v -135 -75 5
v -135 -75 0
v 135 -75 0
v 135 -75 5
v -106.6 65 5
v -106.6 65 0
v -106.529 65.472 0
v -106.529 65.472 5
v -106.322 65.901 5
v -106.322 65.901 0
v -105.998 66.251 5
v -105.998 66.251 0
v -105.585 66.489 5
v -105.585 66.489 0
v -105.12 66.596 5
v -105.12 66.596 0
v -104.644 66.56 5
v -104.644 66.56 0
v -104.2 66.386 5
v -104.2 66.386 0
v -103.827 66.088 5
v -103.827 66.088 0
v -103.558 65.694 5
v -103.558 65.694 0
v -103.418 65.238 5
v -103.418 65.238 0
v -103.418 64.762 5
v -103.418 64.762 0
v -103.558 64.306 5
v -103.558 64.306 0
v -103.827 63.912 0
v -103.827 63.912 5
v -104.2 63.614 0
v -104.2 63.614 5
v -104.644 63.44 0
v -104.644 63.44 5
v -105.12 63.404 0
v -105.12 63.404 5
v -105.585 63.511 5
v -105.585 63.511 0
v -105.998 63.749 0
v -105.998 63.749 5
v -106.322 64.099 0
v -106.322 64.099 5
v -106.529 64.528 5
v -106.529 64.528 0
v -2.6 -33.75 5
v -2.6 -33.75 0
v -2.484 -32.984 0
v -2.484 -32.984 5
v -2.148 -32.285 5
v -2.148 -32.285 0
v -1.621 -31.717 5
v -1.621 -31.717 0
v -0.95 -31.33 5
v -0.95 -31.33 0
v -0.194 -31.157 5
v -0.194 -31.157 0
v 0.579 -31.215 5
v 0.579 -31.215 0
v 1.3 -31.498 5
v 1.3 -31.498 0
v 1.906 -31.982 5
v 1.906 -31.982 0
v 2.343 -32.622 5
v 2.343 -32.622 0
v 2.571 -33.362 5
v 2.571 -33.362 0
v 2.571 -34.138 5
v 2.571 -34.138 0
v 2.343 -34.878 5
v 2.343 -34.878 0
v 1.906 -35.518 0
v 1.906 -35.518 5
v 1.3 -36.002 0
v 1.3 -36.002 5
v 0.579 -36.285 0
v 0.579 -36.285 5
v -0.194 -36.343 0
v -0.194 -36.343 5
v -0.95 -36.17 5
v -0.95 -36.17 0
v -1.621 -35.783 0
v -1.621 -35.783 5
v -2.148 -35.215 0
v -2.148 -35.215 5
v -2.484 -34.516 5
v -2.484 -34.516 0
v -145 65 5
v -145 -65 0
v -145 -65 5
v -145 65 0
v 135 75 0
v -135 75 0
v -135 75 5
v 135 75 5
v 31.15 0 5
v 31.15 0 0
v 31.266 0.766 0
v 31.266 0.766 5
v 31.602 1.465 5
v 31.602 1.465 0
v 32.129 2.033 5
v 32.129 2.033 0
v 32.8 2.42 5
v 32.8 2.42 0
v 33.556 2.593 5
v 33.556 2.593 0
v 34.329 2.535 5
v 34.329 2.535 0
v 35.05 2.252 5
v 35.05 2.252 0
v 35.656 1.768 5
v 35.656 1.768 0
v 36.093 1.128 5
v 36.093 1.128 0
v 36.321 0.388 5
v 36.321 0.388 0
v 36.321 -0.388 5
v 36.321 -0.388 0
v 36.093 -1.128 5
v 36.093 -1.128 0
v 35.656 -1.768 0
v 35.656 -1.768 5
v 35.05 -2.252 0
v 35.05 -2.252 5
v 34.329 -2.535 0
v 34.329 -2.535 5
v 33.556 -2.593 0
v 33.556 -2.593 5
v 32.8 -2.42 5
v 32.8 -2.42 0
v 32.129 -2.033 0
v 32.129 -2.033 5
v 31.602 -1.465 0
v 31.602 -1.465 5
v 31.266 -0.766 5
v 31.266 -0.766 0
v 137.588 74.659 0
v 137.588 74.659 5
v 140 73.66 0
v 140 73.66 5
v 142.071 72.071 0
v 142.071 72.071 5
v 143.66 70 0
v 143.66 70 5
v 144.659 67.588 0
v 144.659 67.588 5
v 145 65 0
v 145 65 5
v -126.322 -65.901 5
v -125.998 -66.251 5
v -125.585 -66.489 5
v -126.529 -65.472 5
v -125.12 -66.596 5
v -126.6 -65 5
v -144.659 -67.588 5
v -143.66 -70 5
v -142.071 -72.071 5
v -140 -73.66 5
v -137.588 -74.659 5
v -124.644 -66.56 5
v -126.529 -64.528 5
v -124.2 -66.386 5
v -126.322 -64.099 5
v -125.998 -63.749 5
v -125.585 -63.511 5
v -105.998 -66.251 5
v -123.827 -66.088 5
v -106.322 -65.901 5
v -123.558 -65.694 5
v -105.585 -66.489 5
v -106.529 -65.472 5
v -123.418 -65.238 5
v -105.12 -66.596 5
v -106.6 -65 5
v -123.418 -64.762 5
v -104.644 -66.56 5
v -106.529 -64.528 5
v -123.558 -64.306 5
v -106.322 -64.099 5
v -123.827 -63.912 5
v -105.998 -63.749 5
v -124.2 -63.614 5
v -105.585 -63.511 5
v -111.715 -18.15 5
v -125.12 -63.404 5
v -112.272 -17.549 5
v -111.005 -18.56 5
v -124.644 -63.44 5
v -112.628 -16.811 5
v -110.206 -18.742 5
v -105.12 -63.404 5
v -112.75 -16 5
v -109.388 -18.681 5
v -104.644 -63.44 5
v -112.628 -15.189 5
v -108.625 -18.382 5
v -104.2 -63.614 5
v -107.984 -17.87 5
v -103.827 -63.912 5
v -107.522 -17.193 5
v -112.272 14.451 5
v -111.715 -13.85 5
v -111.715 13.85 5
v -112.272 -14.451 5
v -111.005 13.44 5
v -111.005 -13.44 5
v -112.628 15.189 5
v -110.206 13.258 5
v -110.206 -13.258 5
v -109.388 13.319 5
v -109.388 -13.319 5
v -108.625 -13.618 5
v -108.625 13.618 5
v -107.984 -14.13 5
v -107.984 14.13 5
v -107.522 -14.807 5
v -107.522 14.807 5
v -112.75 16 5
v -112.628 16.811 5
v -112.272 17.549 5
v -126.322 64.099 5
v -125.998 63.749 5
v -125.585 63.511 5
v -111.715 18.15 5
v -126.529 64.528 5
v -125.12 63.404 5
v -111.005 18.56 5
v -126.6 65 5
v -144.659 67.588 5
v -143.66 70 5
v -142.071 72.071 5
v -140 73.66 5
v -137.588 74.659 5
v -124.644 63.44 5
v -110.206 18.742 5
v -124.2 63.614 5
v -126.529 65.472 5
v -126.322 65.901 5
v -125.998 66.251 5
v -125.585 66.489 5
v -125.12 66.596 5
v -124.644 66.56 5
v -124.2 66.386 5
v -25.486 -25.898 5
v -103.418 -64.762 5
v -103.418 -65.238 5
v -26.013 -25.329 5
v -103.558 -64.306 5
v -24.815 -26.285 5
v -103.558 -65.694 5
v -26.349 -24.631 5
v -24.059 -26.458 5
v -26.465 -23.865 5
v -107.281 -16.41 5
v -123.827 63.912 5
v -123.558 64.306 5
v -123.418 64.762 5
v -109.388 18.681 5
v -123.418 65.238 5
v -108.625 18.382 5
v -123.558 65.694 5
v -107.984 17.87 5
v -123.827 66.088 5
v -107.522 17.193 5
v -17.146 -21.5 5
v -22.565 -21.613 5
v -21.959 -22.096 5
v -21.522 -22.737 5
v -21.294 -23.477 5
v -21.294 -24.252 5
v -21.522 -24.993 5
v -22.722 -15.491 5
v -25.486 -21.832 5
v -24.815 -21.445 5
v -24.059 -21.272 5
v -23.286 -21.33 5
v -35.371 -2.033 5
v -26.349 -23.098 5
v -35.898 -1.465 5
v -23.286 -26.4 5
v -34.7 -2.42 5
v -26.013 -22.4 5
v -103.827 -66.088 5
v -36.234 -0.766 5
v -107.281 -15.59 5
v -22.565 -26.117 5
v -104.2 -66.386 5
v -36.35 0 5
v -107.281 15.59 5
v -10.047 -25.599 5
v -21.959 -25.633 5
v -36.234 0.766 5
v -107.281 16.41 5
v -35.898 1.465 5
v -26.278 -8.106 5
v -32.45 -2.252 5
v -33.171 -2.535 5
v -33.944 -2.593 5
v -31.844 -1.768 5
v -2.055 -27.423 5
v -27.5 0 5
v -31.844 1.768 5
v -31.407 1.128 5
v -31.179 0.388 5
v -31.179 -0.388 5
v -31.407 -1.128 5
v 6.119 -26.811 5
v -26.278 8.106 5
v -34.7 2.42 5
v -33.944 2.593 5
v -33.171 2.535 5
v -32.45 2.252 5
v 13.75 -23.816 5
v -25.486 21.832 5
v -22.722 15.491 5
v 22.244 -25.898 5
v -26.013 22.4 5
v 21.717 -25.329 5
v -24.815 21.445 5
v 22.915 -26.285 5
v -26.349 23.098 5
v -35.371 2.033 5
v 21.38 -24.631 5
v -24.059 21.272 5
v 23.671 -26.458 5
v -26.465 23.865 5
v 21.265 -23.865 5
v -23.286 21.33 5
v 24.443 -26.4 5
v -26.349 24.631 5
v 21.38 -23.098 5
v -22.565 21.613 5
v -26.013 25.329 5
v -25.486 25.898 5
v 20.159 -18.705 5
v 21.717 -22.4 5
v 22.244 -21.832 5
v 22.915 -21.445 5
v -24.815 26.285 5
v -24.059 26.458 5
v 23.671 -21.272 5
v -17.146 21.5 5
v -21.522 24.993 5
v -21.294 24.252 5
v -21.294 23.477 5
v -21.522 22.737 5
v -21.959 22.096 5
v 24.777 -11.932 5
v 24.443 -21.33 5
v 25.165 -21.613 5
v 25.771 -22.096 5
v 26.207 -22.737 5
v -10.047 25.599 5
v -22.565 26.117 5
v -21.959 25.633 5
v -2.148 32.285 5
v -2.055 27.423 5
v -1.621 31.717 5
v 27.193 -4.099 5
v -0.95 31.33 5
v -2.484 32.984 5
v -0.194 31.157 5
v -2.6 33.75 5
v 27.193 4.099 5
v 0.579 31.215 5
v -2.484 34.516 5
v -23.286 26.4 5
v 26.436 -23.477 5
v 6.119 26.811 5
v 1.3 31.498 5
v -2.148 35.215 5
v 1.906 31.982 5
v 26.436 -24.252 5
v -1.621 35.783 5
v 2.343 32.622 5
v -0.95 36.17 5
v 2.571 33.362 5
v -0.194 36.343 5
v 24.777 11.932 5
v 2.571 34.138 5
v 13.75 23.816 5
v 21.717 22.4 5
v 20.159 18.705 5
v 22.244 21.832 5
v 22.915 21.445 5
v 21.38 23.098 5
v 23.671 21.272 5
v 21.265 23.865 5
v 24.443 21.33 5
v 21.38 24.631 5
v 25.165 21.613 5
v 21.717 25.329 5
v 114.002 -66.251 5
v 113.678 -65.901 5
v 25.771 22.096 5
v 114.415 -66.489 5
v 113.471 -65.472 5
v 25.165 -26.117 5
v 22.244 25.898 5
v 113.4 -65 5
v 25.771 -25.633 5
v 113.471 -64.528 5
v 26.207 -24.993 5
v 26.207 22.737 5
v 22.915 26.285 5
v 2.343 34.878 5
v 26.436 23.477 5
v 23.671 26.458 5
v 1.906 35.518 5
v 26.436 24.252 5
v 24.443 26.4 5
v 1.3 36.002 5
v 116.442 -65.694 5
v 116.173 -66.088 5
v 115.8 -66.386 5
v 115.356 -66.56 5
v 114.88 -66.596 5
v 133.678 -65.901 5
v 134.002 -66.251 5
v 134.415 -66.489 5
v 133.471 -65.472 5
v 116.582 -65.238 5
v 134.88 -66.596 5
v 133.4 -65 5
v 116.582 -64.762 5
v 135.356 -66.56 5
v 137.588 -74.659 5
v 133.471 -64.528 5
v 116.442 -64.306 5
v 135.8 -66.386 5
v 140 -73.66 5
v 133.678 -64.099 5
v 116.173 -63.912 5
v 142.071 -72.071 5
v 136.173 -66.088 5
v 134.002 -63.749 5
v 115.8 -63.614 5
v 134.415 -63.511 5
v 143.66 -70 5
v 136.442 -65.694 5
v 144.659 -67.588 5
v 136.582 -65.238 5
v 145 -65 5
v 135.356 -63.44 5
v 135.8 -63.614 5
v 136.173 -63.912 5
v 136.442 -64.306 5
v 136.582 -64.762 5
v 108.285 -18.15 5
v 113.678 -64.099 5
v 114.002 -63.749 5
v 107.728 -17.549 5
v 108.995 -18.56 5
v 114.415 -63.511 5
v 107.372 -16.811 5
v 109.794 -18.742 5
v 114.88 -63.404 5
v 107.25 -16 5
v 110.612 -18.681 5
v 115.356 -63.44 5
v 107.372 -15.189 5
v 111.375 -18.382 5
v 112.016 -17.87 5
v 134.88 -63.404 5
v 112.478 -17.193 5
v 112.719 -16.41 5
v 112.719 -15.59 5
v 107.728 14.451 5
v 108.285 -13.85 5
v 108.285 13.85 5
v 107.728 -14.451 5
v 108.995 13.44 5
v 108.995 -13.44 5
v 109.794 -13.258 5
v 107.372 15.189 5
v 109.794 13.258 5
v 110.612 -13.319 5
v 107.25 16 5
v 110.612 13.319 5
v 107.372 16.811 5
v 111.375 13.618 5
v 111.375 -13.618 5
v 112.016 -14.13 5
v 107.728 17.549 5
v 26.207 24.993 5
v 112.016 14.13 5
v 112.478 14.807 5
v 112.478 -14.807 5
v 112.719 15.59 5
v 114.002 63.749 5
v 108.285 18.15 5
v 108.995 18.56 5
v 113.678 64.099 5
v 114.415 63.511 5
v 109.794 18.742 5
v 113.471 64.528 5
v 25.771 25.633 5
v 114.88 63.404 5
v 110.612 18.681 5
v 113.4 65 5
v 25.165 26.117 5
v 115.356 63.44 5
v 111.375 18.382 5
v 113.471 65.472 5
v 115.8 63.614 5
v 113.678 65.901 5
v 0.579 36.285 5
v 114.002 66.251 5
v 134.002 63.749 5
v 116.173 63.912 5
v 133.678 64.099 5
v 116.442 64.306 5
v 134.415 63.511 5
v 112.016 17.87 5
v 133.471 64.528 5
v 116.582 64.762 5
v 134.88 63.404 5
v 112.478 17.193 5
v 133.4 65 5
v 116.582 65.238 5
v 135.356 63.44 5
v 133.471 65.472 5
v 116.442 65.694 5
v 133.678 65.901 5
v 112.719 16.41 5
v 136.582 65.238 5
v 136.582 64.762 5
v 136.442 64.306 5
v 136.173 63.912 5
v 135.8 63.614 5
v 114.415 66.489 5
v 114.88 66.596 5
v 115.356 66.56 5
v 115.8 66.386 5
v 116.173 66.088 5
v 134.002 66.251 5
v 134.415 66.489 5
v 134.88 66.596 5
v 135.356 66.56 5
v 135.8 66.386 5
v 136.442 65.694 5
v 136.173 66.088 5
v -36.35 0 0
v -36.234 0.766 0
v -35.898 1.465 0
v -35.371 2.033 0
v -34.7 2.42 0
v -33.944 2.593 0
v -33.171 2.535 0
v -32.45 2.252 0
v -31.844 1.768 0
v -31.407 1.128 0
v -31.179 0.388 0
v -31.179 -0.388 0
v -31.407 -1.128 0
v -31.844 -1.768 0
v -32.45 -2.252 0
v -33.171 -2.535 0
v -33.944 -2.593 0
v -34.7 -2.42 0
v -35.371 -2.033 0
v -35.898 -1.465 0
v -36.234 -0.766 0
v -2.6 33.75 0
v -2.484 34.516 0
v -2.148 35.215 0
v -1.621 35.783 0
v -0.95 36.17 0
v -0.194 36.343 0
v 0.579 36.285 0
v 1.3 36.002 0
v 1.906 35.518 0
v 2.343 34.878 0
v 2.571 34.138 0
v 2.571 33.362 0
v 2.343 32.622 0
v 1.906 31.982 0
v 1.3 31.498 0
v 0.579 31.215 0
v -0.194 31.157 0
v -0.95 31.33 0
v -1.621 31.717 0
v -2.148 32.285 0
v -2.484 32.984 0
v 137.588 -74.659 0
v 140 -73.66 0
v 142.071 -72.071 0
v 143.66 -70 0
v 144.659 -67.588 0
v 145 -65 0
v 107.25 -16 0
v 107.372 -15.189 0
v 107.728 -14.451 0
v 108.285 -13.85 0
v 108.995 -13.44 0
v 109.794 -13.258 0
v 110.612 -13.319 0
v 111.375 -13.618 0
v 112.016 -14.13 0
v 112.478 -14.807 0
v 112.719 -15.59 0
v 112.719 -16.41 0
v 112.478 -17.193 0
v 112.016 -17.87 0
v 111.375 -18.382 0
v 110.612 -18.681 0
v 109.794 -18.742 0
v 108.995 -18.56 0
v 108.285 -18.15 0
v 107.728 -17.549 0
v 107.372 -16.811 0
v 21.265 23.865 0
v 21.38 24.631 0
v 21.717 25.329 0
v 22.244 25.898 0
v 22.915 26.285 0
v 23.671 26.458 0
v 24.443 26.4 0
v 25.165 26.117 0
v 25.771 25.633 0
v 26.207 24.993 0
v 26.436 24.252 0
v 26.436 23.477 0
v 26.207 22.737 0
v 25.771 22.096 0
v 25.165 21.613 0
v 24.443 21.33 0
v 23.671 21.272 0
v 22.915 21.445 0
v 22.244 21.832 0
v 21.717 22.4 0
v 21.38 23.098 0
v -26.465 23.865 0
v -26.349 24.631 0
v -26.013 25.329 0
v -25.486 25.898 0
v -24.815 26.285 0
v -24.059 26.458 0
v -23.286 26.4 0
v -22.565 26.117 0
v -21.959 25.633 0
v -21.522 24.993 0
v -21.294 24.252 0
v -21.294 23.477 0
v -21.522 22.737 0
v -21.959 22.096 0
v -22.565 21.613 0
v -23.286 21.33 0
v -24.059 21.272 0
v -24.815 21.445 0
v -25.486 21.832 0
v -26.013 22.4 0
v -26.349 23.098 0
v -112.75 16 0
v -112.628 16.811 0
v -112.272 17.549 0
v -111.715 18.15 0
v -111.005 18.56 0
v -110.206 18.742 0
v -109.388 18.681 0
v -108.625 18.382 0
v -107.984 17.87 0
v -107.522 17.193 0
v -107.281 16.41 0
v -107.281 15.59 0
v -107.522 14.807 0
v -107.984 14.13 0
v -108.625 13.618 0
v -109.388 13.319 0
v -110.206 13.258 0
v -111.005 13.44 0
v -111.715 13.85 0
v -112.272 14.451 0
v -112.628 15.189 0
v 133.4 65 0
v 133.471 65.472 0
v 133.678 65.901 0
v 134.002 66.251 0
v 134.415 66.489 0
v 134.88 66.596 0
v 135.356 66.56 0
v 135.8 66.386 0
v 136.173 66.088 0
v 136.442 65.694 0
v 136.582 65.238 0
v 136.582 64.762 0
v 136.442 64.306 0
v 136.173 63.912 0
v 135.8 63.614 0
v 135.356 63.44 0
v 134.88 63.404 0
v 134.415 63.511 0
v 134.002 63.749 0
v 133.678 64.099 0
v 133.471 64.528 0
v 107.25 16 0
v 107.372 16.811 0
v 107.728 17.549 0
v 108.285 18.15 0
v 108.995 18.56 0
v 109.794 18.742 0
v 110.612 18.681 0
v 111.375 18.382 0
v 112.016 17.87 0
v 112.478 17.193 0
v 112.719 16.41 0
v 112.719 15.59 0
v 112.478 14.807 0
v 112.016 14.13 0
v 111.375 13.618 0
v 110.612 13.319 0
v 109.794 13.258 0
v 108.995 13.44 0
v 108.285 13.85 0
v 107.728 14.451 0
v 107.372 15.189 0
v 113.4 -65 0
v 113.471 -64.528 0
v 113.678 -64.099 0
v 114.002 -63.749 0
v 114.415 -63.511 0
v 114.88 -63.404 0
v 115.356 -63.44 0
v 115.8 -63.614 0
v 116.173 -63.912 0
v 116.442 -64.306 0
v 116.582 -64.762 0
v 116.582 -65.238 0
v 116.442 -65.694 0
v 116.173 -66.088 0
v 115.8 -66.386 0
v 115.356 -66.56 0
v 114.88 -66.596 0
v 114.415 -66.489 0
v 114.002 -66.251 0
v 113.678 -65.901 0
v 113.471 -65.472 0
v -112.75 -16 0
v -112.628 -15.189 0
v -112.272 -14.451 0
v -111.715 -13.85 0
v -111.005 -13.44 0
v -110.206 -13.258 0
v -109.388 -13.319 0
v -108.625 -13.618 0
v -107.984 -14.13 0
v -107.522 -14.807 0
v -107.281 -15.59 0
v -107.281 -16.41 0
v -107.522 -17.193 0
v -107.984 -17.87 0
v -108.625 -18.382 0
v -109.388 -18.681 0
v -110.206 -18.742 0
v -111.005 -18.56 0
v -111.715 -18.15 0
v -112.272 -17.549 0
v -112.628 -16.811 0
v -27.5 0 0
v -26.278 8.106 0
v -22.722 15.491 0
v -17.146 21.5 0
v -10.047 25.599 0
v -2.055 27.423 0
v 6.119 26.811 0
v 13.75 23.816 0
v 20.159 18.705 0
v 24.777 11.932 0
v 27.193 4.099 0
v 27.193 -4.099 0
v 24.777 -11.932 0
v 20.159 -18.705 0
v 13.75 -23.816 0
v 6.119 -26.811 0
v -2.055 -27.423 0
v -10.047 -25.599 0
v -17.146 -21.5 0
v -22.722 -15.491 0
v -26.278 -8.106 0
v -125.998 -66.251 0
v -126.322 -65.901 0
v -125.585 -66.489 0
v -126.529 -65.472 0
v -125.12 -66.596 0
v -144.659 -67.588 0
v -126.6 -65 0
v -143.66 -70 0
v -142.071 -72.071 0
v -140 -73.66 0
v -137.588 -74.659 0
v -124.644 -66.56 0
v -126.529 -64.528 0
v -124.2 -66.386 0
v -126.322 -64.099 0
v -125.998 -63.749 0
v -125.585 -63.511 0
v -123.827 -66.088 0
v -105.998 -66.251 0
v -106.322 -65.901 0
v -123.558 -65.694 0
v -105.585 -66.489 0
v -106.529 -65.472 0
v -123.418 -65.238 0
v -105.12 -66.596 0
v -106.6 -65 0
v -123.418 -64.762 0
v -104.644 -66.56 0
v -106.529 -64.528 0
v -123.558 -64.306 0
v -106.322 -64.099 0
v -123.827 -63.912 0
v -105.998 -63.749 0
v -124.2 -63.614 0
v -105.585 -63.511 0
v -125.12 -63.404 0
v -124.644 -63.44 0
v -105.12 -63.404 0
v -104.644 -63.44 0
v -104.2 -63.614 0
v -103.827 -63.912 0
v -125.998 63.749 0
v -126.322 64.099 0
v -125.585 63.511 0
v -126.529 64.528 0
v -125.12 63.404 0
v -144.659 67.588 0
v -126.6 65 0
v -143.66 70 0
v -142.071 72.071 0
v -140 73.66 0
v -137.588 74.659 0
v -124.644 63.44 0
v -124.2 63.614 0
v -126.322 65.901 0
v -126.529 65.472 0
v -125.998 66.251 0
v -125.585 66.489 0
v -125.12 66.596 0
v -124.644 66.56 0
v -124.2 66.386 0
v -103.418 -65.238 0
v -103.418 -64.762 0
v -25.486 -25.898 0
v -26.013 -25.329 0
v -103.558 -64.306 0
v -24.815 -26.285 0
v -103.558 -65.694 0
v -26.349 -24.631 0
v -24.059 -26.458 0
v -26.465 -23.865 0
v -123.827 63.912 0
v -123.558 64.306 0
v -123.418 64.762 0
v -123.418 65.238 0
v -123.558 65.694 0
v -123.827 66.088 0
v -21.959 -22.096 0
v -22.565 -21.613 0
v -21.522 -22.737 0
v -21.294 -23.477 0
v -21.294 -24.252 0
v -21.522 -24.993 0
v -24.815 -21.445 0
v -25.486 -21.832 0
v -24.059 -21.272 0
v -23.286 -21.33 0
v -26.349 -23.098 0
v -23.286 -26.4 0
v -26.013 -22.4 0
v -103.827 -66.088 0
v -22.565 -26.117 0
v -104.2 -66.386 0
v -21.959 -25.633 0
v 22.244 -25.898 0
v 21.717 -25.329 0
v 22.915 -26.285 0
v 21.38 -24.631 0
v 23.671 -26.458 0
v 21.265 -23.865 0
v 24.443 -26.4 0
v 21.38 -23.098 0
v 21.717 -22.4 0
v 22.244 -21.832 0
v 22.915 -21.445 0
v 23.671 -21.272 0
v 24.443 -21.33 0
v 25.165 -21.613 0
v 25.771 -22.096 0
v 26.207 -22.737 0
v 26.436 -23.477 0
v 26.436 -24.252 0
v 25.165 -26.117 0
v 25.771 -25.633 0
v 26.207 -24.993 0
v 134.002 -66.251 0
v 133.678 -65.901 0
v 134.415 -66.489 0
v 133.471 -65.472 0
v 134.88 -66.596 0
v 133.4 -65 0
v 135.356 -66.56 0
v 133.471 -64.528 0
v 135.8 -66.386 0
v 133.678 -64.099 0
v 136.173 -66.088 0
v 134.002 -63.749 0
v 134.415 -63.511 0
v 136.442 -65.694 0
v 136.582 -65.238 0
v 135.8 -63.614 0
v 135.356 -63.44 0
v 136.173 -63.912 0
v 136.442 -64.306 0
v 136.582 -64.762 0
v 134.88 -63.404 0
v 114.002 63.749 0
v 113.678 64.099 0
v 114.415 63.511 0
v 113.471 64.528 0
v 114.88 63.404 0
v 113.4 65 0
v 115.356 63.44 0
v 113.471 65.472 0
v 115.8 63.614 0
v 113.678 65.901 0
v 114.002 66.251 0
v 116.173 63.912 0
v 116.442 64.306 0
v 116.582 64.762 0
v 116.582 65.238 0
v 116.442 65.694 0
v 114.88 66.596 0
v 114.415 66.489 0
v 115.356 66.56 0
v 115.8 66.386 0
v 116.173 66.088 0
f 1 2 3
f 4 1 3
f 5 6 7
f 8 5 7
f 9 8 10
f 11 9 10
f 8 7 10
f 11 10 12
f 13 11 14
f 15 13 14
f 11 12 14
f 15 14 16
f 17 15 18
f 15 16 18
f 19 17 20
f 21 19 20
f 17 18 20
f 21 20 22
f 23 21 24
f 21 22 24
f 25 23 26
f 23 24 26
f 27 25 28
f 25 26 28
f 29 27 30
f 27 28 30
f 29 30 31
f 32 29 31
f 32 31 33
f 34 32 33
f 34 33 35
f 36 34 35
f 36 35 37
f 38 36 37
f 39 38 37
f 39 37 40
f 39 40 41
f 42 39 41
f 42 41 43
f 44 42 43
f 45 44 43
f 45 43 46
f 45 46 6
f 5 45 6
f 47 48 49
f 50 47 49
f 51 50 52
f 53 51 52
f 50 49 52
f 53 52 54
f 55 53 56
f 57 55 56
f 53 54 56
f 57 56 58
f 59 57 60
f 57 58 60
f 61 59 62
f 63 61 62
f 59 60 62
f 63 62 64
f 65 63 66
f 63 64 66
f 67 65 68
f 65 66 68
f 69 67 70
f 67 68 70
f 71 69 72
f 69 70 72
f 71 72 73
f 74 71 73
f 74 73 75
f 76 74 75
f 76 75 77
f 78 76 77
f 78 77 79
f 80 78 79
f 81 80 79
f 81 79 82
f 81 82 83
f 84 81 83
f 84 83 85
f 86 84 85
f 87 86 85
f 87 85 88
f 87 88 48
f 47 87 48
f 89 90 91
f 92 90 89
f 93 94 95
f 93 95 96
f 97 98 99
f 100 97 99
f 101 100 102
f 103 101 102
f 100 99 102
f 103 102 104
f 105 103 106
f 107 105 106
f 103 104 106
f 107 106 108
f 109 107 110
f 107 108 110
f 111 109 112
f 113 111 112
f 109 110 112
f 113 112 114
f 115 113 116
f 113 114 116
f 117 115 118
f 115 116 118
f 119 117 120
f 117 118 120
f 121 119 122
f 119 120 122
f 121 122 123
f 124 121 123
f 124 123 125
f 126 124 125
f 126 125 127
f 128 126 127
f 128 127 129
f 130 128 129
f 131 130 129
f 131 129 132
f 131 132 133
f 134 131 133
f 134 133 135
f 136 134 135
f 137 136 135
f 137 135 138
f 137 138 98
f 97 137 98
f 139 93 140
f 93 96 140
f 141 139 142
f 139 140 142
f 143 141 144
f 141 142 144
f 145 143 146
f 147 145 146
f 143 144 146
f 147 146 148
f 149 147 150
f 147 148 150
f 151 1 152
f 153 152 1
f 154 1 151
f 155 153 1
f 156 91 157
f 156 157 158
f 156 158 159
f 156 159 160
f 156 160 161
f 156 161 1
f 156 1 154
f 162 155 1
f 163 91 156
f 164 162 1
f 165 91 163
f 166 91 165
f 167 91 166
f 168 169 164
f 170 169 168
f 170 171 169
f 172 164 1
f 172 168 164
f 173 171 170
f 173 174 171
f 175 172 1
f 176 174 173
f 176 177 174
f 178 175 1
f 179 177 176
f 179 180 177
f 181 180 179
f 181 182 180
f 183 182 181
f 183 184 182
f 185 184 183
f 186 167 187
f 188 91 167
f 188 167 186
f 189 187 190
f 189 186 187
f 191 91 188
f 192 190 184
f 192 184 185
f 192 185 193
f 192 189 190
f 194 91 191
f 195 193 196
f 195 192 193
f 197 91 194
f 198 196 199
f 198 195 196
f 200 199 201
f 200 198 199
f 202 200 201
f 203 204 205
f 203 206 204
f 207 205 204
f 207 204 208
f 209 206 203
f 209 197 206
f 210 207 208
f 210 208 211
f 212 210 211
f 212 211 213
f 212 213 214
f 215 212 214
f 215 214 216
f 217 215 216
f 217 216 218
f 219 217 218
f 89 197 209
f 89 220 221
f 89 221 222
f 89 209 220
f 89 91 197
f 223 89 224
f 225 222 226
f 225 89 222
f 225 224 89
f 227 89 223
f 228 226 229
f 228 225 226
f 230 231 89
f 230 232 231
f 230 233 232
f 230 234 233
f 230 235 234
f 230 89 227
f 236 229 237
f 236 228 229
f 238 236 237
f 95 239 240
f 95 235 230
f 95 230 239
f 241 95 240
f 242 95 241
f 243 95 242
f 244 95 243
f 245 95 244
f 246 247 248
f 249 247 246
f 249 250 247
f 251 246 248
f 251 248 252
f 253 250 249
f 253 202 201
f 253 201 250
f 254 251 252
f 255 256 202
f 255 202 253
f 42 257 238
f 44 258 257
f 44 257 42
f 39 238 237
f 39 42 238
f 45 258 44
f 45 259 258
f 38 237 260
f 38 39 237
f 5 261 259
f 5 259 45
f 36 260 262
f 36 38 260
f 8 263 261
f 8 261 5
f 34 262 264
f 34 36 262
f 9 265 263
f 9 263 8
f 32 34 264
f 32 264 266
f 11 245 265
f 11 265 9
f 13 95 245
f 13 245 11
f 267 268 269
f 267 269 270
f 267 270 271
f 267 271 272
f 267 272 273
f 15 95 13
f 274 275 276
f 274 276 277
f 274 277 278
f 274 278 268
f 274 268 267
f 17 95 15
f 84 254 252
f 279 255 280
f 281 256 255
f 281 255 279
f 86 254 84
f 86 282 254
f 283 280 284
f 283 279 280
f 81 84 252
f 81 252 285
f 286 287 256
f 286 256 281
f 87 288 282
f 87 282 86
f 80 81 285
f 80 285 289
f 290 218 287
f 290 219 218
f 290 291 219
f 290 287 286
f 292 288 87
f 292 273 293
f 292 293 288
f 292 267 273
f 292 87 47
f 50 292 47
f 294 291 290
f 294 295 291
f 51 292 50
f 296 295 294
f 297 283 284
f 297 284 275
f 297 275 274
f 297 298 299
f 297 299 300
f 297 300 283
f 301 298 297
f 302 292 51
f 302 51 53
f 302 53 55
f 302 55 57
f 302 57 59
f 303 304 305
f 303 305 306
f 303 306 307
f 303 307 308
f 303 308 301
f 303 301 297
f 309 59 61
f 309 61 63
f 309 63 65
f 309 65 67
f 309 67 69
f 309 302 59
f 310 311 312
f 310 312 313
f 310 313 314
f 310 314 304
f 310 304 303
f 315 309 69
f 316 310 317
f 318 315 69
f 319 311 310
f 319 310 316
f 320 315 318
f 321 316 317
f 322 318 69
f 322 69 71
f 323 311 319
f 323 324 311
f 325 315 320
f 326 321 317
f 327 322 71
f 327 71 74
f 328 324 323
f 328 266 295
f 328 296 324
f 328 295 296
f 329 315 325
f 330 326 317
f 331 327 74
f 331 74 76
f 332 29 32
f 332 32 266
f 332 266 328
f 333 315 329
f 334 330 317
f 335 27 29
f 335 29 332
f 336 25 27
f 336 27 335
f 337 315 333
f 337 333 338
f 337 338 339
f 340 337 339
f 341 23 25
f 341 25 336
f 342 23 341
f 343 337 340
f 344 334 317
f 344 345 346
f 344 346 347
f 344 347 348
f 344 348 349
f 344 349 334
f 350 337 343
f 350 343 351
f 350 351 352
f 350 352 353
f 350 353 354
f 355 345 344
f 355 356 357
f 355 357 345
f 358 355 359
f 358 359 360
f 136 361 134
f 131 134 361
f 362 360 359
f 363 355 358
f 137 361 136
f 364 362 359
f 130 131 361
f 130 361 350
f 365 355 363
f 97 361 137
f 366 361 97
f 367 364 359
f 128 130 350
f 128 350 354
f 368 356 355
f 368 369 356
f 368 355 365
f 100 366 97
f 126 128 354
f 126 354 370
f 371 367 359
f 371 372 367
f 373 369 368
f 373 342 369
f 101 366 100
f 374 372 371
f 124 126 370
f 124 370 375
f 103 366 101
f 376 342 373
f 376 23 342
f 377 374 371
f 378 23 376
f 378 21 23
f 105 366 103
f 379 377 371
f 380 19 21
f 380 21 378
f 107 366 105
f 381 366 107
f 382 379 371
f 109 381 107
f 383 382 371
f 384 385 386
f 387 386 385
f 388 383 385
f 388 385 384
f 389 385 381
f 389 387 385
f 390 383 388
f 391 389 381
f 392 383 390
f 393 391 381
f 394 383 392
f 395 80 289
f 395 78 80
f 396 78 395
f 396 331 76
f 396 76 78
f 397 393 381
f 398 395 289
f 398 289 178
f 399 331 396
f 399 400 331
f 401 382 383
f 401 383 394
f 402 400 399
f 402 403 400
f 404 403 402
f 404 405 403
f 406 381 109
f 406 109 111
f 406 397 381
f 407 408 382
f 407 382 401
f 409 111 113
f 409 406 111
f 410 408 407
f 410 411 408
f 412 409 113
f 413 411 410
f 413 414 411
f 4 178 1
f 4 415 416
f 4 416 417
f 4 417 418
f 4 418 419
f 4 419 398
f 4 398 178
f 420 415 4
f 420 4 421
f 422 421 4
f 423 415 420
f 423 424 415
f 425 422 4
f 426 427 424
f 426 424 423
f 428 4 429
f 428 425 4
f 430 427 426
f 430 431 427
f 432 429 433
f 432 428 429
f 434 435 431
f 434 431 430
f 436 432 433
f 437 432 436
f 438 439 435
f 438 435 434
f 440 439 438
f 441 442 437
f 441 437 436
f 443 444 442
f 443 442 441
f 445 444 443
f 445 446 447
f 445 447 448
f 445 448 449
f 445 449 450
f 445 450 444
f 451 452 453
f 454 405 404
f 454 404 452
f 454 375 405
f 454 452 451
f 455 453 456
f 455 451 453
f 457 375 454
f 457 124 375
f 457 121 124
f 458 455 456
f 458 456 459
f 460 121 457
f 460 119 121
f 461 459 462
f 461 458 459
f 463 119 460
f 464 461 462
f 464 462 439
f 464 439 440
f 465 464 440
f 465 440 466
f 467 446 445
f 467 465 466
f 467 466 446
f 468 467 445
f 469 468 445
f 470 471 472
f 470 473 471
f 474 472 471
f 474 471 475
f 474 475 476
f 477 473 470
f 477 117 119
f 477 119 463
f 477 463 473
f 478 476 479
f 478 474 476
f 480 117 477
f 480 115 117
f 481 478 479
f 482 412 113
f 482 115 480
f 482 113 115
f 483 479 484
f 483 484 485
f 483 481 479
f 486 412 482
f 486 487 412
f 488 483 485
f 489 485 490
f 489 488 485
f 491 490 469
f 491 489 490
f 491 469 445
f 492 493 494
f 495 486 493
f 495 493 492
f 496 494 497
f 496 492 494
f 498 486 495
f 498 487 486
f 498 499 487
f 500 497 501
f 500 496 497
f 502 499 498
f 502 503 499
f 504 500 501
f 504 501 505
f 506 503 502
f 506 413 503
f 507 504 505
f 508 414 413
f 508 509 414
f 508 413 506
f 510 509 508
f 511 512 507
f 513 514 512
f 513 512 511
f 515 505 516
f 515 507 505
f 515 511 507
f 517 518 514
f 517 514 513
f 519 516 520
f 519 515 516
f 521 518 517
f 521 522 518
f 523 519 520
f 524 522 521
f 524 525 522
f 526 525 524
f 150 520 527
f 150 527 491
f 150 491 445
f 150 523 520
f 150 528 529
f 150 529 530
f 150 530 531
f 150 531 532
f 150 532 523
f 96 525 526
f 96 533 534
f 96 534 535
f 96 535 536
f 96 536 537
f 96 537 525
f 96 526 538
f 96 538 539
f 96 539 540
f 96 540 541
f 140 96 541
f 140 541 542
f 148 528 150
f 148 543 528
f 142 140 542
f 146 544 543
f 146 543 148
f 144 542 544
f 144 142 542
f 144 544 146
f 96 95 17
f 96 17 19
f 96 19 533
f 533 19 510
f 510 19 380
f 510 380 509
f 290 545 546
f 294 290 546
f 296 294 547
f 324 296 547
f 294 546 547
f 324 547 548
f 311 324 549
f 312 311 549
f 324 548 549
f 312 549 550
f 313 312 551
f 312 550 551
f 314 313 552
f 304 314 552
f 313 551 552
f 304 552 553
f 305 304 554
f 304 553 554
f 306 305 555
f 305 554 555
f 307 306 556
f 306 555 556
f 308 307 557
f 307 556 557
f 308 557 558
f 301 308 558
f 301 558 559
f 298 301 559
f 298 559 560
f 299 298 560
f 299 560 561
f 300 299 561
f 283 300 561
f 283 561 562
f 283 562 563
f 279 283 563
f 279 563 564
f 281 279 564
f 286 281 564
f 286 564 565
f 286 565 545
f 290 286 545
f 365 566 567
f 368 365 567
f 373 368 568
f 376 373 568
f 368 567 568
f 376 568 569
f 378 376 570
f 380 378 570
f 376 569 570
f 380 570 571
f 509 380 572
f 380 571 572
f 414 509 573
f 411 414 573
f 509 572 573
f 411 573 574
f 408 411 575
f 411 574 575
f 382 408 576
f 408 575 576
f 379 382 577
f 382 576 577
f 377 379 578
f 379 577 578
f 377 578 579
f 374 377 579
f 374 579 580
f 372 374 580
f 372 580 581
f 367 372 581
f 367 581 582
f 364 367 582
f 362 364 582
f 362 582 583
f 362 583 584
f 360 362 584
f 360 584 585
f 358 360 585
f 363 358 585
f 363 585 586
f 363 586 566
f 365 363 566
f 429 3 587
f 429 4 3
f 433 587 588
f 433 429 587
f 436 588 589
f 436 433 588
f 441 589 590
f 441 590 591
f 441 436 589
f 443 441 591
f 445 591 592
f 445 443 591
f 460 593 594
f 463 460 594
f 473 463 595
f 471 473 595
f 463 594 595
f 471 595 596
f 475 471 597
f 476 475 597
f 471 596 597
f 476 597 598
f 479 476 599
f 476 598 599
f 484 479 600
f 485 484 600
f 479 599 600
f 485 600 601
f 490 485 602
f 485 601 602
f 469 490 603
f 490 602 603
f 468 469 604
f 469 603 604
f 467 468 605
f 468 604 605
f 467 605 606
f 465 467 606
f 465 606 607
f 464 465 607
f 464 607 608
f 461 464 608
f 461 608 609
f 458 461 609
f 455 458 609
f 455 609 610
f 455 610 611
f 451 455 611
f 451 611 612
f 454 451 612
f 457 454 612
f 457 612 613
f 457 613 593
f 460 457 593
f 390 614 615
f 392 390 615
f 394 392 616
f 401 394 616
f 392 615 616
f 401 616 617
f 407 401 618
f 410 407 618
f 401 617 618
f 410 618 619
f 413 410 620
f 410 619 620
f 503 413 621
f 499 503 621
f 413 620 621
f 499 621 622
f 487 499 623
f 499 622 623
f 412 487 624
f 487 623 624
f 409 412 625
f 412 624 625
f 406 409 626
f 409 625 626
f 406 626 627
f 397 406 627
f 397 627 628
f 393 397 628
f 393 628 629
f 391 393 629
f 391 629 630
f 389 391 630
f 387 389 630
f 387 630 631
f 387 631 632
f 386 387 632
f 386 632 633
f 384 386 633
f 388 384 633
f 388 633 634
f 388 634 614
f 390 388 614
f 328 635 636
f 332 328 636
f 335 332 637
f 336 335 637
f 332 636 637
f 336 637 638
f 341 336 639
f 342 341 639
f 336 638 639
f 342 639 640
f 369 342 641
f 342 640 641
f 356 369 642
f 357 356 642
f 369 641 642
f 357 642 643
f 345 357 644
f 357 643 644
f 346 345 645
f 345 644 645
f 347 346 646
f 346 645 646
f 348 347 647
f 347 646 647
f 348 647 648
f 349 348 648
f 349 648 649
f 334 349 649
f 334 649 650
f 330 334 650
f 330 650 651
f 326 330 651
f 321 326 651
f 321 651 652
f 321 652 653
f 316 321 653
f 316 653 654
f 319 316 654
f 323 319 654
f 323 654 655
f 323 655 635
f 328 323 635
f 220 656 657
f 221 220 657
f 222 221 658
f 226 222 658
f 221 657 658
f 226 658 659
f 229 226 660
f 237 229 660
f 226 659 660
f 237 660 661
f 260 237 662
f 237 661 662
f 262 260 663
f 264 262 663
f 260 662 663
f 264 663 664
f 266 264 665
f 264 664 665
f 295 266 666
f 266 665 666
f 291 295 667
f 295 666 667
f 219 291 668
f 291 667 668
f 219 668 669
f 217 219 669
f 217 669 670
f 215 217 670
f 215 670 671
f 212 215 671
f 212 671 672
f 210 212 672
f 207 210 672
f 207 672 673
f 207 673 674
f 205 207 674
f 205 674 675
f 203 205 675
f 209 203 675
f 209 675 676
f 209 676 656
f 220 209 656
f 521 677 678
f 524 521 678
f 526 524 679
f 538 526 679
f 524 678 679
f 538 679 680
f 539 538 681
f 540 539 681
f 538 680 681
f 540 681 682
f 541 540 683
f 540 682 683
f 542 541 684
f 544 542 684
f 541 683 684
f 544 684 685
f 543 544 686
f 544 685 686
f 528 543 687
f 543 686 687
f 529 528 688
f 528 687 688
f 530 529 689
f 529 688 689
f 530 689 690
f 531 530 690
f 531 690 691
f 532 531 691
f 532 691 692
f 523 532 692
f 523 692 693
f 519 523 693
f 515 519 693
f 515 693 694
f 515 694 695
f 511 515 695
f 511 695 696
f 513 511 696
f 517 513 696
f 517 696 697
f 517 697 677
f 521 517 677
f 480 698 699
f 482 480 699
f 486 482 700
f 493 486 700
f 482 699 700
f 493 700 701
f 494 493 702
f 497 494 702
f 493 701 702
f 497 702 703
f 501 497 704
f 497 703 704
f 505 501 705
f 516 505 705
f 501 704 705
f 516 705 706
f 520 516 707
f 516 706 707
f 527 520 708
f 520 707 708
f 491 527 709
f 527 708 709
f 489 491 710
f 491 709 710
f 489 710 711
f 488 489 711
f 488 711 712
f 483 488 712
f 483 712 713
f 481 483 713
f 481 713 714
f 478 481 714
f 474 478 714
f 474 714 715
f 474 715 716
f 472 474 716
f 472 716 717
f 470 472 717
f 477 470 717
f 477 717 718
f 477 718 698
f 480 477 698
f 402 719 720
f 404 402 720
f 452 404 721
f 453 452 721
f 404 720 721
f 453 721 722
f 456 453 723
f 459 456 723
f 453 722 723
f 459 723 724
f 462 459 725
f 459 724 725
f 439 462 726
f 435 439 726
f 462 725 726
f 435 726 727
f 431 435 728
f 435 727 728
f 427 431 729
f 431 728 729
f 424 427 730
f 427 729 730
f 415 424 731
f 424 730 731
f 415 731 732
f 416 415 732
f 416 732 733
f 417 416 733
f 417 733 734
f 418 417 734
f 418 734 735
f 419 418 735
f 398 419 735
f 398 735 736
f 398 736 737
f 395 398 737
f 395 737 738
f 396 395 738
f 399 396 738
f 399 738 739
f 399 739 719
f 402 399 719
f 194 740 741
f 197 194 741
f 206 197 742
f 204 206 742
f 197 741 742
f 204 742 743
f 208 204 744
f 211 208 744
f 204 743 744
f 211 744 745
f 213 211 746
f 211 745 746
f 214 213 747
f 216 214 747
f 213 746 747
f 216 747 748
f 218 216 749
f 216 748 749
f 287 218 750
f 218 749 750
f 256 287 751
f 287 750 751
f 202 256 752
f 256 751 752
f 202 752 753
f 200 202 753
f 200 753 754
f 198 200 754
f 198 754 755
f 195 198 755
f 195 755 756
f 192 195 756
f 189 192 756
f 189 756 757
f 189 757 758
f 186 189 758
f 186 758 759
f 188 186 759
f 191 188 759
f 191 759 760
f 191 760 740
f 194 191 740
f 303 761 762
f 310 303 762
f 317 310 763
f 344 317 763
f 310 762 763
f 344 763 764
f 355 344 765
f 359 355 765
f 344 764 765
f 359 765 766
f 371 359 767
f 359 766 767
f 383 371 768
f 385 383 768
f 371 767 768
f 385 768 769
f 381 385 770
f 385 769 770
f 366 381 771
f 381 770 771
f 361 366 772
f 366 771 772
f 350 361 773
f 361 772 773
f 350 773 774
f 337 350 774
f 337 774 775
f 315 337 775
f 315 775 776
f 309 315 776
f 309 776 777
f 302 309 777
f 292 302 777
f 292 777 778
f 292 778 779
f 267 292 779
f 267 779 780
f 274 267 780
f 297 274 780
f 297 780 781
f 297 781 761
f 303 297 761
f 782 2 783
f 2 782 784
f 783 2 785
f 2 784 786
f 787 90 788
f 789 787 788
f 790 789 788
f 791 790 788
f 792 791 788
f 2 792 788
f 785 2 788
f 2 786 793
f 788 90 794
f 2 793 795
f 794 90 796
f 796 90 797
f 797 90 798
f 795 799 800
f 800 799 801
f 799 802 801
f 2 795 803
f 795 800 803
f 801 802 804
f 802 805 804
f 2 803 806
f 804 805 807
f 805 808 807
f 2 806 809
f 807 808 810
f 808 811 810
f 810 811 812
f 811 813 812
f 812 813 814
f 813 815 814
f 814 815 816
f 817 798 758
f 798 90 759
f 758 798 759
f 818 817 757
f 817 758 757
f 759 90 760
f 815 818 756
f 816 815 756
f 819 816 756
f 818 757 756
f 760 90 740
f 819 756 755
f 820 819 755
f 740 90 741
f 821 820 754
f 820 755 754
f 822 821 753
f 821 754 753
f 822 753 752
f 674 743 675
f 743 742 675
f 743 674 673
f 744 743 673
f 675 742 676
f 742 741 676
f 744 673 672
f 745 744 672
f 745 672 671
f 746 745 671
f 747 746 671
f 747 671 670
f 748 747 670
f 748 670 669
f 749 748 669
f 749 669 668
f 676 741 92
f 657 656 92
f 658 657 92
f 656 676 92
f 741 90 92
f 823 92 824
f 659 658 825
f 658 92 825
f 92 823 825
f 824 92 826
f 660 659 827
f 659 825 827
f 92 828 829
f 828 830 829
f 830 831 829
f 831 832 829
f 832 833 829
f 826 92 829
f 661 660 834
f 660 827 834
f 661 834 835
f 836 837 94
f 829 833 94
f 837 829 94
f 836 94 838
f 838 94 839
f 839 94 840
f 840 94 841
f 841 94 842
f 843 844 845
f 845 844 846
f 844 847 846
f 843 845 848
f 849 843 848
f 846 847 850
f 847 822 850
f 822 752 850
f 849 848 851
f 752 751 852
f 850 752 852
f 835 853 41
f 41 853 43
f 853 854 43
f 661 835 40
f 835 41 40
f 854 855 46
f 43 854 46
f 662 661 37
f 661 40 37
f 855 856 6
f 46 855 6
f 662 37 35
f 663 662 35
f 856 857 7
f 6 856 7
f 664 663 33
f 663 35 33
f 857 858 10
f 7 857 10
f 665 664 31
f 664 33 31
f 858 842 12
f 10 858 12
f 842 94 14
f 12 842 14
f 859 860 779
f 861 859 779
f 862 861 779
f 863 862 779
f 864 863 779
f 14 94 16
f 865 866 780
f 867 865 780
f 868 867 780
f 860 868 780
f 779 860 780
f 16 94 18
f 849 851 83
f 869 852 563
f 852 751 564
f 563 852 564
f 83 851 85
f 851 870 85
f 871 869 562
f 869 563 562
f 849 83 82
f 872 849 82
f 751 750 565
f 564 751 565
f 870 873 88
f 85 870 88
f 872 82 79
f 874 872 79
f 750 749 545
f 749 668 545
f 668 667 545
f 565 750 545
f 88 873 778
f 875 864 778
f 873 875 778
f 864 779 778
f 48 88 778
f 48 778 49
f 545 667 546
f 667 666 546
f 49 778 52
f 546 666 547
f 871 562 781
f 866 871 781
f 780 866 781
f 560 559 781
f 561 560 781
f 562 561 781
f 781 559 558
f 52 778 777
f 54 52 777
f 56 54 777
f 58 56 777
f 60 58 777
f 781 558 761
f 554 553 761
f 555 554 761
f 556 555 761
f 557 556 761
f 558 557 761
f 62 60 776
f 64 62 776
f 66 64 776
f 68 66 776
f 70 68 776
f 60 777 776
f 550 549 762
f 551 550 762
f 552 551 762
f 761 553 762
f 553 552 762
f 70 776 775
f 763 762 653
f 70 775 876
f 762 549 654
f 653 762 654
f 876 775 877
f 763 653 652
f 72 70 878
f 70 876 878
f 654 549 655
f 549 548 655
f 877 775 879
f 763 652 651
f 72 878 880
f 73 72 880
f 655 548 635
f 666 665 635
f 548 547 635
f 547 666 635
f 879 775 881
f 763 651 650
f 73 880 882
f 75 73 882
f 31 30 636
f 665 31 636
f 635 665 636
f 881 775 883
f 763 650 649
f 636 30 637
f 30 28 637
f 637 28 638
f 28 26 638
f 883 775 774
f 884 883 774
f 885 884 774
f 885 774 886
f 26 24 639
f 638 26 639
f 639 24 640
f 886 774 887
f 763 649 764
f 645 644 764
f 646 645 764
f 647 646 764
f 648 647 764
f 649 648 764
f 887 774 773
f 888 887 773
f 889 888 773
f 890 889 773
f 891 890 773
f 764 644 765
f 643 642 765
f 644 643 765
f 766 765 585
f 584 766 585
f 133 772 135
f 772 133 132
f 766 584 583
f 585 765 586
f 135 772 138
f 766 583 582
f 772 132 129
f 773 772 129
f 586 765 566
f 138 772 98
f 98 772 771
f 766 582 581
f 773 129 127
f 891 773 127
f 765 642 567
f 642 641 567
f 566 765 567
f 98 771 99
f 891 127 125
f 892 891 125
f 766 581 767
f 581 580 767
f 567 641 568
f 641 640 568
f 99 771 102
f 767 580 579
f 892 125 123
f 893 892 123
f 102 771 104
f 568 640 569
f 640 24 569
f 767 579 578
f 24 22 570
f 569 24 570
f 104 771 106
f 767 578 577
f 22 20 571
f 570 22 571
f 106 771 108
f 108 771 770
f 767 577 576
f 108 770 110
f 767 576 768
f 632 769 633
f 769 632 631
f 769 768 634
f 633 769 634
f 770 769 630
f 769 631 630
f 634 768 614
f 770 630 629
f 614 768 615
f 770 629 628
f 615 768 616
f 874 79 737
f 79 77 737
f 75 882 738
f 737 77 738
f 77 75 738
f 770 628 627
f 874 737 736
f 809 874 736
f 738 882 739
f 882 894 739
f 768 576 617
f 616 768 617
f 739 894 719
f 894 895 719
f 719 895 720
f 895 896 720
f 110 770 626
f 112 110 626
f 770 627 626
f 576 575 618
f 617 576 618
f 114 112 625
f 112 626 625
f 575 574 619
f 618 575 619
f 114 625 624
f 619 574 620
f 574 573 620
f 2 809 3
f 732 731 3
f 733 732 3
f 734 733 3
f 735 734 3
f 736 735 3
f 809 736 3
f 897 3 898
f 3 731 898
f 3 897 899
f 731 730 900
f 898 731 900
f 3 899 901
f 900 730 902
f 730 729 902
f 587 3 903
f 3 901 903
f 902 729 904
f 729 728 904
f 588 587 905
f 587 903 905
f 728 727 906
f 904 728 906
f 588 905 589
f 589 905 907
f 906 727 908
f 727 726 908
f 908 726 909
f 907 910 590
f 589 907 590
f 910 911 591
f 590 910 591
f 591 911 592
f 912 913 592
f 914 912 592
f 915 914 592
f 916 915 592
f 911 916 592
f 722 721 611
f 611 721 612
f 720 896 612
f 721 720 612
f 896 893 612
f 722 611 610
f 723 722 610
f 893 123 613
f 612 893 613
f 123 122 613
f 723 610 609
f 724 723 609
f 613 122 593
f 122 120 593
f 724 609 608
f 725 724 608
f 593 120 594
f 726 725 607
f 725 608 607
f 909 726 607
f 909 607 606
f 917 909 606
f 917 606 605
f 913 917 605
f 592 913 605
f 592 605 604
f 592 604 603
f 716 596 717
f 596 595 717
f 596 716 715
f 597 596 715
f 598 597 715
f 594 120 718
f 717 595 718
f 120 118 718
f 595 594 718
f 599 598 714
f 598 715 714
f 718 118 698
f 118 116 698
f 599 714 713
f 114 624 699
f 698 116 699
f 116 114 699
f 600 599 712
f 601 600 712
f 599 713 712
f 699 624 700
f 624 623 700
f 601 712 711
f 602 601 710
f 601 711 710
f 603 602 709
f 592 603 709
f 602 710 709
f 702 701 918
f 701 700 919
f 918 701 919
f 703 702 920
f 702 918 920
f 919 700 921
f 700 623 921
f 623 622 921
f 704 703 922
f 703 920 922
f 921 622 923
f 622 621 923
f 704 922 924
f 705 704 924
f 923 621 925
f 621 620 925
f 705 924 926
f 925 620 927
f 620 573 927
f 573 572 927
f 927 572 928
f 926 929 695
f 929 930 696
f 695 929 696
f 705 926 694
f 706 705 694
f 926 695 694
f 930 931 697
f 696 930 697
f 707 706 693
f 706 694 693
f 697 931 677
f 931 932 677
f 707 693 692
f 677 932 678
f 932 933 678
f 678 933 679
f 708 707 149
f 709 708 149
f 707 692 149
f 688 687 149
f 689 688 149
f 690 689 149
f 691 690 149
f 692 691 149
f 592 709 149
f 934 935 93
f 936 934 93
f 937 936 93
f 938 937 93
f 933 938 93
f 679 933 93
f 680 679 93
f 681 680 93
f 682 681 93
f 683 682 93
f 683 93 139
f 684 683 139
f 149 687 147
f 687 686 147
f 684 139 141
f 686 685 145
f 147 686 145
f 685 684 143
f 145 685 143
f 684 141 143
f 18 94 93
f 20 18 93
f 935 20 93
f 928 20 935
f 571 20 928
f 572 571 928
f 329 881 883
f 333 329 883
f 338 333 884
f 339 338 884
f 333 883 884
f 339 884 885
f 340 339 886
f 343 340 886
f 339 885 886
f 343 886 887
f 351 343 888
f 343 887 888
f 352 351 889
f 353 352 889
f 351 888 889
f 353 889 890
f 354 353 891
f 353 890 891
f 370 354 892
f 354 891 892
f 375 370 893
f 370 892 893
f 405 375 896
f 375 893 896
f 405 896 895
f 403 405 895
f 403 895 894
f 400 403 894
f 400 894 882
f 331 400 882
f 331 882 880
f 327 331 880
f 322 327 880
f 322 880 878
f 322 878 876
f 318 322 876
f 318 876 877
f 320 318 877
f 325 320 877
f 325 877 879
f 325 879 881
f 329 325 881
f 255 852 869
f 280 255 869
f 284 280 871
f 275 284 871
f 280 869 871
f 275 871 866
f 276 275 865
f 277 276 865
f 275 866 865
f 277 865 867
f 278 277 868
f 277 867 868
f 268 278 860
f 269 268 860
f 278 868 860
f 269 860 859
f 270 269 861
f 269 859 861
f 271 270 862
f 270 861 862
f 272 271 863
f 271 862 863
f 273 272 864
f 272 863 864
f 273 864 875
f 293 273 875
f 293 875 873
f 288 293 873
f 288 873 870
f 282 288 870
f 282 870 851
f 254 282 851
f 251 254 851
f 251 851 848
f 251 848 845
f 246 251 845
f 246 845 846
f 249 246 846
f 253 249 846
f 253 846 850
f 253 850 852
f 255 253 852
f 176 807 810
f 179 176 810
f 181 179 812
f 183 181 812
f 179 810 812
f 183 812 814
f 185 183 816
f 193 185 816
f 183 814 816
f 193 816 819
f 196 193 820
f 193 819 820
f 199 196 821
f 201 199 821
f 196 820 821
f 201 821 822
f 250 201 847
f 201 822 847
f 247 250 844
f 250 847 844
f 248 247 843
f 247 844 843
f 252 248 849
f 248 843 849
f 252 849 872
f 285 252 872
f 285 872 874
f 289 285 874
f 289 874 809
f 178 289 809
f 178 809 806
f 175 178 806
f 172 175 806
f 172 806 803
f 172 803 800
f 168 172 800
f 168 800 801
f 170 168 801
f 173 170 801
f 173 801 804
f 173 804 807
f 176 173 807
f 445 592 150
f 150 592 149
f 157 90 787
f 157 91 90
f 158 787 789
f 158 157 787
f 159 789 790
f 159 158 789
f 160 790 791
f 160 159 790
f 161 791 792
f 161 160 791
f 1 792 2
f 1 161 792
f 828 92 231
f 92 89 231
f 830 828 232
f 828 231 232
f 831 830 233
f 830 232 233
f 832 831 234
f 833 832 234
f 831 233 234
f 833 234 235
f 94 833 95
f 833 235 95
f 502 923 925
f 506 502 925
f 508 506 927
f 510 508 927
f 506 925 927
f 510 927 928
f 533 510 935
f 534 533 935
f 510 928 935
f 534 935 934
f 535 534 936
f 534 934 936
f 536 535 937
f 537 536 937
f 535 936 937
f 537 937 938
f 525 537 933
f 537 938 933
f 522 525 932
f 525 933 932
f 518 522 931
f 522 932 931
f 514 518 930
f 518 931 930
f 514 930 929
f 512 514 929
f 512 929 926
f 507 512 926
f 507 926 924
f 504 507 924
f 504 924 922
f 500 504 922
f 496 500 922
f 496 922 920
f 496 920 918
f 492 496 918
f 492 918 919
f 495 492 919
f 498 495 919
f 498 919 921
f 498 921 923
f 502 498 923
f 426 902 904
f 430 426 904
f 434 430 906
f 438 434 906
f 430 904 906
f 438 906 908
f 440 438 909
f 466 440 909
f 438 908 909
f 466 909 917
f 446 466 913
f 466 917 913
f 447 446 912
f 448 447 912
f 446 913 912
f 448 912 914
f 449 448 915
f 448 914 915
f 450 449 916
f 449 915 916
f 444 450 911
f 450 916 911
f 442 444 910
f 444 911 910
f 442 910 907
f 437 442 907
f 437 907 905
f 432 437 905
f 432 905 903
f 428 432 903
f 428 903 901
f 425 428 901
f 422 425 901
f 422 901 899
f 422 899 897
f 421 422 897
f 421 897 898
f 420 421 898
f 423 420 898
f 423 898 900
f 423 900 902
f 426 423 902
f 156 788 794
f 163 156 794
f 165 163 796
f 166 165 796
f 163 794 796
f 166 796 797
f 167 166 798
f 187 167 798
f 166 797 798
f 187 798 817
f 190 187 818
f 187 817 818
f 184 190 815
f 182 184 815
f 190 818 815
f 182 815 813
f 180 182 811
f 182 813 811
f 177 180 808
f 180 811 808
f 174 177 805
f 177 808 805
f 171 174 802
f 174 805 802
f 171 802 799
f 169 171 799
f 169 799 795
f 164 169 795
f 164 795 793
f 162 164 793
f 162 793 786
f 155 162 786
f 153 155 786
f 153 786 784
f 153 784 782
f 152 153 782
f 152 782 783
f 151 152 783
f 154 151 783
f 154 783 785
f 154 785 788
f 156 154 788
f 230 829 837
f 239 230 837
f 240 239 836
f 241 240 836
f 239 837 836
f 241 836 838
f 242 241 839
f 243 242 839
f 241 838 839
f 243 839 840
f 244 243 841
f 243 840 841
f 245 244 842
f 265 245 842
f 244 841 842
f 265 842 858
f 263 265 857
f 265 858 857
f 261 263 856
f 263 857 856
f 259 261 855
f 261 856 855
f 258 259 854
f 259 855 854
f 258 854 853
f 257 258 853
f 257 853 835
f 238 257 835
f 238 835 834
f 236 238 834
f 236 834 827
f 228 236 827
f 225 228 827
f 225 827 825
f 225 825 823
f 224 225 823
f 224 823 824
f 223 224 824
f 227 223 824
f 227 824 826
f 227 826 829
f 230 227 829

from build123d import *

# Parameters (mm, degrees)
SKETCH_1_W          = 290
SKETCH_1_H          = 150
EXTRUDE_1_DEPTH     = 5
CUT_EXTRUDE_2_REACH = 165.325
SKETCH_5_R          = 27.5
SKETCH_5_R_2        = 2.6
FILLET_1_R          = 10
SKETCH_6_R          = 2.75
CUT_EXTRUDE_3_DEPTH = 10
SKETCH_7_R          = 1.6
CUT_EXTRUDE_4_DEPTH = 10


with BuildPart() as part:
    # 草图1 → 凸台-拉伸1 (new body)
    with BuildSketch(Plane.XY):
        Rectangle(SKETCH_1_W, SKETCH_1_H)
    extrude(amount=EXTRUDE_1_DEPTH)

    # 草图5 → 切除-拉伸2 (cut, up to next)
    with BuildSketch(Plane(origin=(0, 0, 0), x_dir=(-1, 0, 0), z_dir=(0, 0, -1)), mode=Mode.PRIVATE) as cut_extrude_2_sk1:
        Circle(SKETCH_5_R)
    cut_extrude_2_tool1 = extrude(cut_extrude_2_sk1.sketch, amount=-CUT_EXTRUDE_2_REACH, mode=Mode.PRIVATE) & part.part
    # 草图5 → 切除-拉伸2 (cut, up to next)
    with BuildSketch(Plane(origin=(0, 0, 0), x_dir=(-1, 0, 0), z_dir=(0, 0, -1)), mode=Mode.PRIVATE) as cut_extrude_2_sk2:
        with Locations((23.864853865, 23.864853865)):
            Circle(SKETCH_5_R_2)
    cut_extrude_2_tool2 = extrude(cut_extrude_2_sk2.sketch, amount=-CUT_EXTRUDE_2_REACH, mode=Mode.PRIVATE) & part.part
    # 草图5 → 切除-拉伸2 (cut, up to next)
    with BuildSketch(Plane(origin=(0, 0, 0), x_dir=(-1, 0, 0), z_dir=(0, 0, -1)), mode=Mode.PRIVATE) as cut_extrude_2_sk3:
        with Locations((0, 33.75)):
            Circle(SKETCH_5_R_2)
    cut_extrude_2_tool3 = extrude(cut_extrude_2_sk3.sketch, amount=-CUT_EXTRUDE_2_REACH, mode=Mode.PRIVATE) & part.part
    # 草图5 → 切除-拉伸2 (cut, up to next)
    with BuildSketch(Plane(origin=(0, 0, 0), x_dir=(-1, 0, 0), z_dir=(0, 0, -1)), mode=Mode.PRIVATE) as cut_extrude_2_sk4:
        with Locations((-23.864853865, 23.864853865)):
            Circle(SKETCH_5_R_2)
    cut_extrude_2_tool4 = extrude(cut_extrude_2_sk4.sketch, amount=-CUT_EXTRUDE_2_REACH, mode=Mode.PRIVATE) & part.part
    # 草图5 → 切除-拉伸2 (cut, up to next)
    with BuildSketch(Plane(origin=(0, 0, 0), x_dir=(-1, 0, 0), z_dir=(0, 0, -1)), mode=Mode.PRIVATE) as cut_extrude_2_sk5:
        with Locations((-33.75, 0)):
            Circle(SKETCH_5_R_2)
    cut_extrude_2_tool5 = extrude(cut_extrude_2_sk5.sketch, amount=-CUT_EXTRUDE_2_REACH, mode=Mode.PRIVATE) & part.part
    # 草图5 → 切除-拉伸2 (cut, up to next)
    with BuildSketch(Plane(origin=(0, 0, 0), x_dir=(-1, 0, 0), z_dir=(0, 0, -1)), mode=Mode.PRIVATE) as cut_extrude_2_sk6:
        with Locations((-23.864853865, -23.864853865)):
            Circle(SKETCH_5_R_2)
    cut_extrude_2_tool6 = extrude(cut_extrude_2_sk6.sketch, amount=-CUT_EXTRUDE_2_REACH, mode=Mode.PRIVATE) & part.part
    # 草图5 → 切除-拉伸2 (cut, up to next)
    with BuildSketch(Plane(origin=(0, 0, 0), x_dir=(-1, 0, 0), z_dir=(0, 0, -1)), mode=Mode.PRIVATE) as cut_extrude_2_sk7:
        with Locations((0, -33.75)):
            Circle(SKETCH_5_R_2)
    cut_extrude_2_tool7 = extrude(cut_extrude_2_sk7.sketch, amount=-CUT_EXTRUDE_2_REACH, mode=Mode.PRIVATE) & part.part
    # 草图5 → 切除-拉伸2 (cut, up to next)
    with BuildSketch(Plane(origin=(0, 0, 0), x_dir=(-1, 0, 0), z_dir=(0, 0, -1)), mode=Mode.PRIVATE) as cut_extrude_2_sk8:
        with Locations((23.864853865, -23.864853865)):
            Circle(SKETCH_5_R_2)
    cut_extrude_2_tool8 = extrude(cut_extrude_2_sk8.sketch, amount=-CUT_EXTRUDE_2_REACH, mode=Mode.PRIVATE) & part.part
    # 草图5 → 切除-拉伸2 (cut, up to next)
    with BuildSketch(Plane(origin=(0, 0, 0), x_dir=(-1, 0, 0), z_dir=(0, 0, -1)), mode=Mode.PRIVATE) as cut_extrude_2_sk9:
        with Locations((33.75, 0)):
            Circle(SKETCH_5_R_2)
    cut_extrude_2_tool9 = extrude(cut_extrude_2_sk9.sketch, amount=-CUT_EXTRUDE_2_REACH, mode=Mode.PRIVATE) & part.part
    add(cut_extrude_2_tool1.solids().sort_by_distance((0, 0, 0))[0], mode=Mode.SUBTRACT)
    add(cut_extrude_2_tool2.solids().sort_by_distance((-23.864854, 23.864854, 0))[0], mode=Mode.SUBTRACT)
    add(cut_extrude_2_tool3.solids().sort_by_distance((0, 33.75, 0))[0], mode=Mode.SUBTRACT)
    add(cut_extrude_2_tool4.solids().sort_by_distance((23.864854, 23.864854, 0))[0], mode=Mode.SUBTRACT)
    add(cut_extrude_2_tool5.solids().sort_by_distance((33.75, 0, 0))[0], mode=Mode.SUBTRACT)
    add(cut_extrude_2_tool6.solids().sort_by_distance((23.864854, -23.864854, 0))[0], mode=Mode.SUBTRACT)
    add(cut_extrude_2_tool7.solids().sort_by_distance((0, -33.75, 0))[0], mode=Mode.SUBTRACT)
    add(cut_extrude_2_tool8.solids().sort_by_distance((-23.864854, -23.864854, 0))[0], mode=Mode.SUBTRACT)
    add(cut_extrude_2_tool9.solids().sort_by_distance((-33.75, 0, 0))[0], mode=Mode.SUBTRACT)

    # 圆角1
    fillet_1_edges = [part.edges().sort_by_distance(p)[0] for p in [
        (145, -75, 2.5),
        (-145, -75, 2.5),
        (-145, 75, 2.5),
        (145, 75, 2.5),
    ]]
    fillet(fillet_1_edges, radius=FILLET_1_R)

    # 草图6 → 切除-拉伸3 (cut)
    with BuildSketch(Plane(origin=(0, 0, 0), x_dir=(-1, 0, 0), z_dir=(0, 0, -1))):
        with Locations((110, -16)):
            Circle(SKETCH_6_R)
        with Locations((-110, -16)):
            Circle(SKETCH_6_R)
        with Locations((-110, 16)):
            Circle(SKETCH_6_R)
        with Locations((110, 16)):
            Circle(SKETCH_6_R)
    extrude(amount=-CUT_EXTRUDE_3_DEPTH, mode=Mode.SUBTRACT)

    # 草图7 → 切除-拉伸4 (cut)
    with BuildSketch(Plane(origin=(0, 0, 0), x_dir=(-1, 0, 0), z_dir=(0, 0, -1))):
        with Locations((-135, 65)):
            Circle(SKETCH_7_R)
        with Locations((-115, 65)):
            Circle(SKETCH_7_R)
        with Locations((105, 65)):
            Circle(SKETCH_7_R)
        with Locations((125, 65)):
            Circle(SKETCH_7_R)
        with Locations((105, -65)):
            Circle(SKETCH_7_R)
        with Locations((125, -65)):
            Circle(SKETCH_7_R)
        with Locations((-135, -65)):
            Circle(SKETCH_7_R)
        with Locations((-115, -65)):
            Circle(SKETCH_7_R)
    extrude(amount=-CUT_EXTRUDE_4_DEPTH, mode=Mode.SUBTRACT)


solid = part.part
